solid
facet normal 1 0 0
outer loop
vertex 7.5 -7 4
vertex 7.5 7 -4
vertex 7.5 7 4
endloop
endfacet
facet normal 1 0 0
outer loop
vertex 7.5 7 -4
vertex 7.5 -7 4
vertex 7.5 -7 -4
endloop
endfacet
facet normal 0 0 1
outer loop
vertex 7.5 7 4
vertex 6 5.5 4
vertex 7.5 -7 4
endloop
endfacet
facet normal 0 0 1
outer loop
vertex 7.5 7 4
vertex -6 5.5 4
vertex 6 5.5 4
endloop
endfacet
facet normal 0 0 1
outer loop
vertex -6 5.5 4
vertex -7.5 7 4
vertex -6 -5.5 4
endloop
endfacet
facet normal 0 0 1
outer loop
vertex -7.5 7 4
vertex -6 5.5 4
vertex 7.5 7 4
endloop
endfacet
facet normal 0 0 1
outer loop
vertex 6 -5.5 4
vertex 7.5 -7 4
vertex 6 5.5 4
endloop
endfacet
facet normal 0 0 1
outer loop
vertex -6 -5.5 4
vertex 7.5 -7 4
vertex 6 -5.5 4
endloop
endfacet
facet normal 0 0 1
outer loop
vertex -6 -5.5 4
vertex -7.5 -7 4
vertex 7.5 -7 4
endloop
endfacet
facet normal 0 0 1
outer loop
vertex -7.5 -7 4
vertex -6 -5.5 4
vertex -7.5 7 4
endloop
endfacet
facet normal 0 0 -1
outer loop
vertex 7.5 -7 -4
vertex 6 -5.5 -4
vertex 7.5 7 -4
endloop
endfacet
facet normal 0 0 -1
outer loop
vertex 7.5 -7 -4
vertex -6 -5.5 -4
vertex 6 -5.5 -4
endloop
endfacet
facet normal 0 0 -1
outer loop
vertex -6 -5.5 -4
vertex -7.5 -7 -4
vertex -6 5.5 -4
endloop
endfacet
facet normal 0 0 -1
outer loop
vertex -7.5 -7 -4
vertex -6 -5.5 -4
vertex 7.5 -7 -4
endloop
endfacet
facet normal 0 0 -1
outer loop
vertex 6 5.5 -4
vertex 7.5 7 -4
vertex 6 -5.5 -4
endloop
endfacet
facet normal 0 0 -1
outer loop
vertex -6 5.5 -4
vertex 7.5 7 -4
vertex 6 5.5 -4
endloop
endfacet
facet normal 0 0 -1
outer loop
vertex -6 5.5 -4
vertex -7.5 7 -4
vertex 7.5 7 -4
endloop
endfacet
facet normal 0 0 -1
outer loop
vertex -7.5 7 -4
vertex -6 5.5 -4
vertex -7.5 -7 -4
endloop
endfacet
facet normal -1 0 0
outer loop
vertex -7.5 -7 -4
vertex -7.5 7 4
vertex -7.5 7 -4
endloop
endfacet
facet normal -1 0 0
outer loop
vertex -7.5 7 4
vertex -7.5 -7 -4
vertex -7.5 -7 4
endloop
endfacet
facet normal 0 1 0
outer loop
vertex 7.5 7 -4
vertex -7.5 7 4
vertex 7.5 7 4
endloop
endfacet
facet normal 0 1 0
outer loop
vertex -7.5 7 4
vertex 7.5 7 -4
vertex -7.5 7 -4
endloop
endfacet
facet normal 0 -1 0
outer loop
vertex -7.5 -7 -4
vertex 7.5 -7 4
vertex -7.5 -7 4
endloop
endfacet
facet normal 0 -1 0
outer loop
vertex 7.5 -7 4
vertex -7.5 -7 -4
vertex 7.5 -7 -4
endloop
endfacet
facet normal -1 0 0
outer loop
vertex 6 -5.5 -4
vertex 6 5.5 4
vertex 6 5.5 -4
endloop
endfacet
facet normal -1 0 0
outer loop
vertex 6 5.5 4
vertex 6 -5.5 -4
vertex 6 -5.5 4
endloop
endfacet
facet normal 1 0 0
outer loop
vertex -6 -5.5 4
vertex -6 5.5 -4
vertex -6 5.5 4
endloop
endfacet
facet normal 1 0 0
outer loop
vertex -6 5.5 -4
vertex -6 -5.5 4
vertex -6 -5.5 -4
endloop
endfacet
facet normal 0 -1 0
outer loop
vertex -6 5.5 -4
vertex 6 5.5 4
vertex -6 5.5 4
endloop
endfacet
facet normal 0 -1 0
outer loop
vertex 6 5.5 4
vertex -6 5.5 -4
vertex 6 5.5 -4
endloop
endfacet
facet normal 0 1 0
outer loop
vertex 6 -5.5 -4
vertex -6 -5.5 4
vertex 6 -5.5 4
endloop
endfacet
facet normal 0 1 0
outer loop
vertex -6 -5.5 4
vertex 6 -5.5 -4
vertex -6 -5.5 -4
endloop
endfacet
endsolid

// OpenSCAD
$fn=100;
long_trou=3;
long_bosse=2;
long_totale=long_trou+long_bosse;

largeur_courroie=12;
hauteur_courroie=2.4;

epaisseur_plaque=0.5;


hauteur=8;

difference() {
cube([largeur_courroie+3,14,hauteur], center=true);
cube([largeur_courroie,	11,hauteur], center=true);
}
